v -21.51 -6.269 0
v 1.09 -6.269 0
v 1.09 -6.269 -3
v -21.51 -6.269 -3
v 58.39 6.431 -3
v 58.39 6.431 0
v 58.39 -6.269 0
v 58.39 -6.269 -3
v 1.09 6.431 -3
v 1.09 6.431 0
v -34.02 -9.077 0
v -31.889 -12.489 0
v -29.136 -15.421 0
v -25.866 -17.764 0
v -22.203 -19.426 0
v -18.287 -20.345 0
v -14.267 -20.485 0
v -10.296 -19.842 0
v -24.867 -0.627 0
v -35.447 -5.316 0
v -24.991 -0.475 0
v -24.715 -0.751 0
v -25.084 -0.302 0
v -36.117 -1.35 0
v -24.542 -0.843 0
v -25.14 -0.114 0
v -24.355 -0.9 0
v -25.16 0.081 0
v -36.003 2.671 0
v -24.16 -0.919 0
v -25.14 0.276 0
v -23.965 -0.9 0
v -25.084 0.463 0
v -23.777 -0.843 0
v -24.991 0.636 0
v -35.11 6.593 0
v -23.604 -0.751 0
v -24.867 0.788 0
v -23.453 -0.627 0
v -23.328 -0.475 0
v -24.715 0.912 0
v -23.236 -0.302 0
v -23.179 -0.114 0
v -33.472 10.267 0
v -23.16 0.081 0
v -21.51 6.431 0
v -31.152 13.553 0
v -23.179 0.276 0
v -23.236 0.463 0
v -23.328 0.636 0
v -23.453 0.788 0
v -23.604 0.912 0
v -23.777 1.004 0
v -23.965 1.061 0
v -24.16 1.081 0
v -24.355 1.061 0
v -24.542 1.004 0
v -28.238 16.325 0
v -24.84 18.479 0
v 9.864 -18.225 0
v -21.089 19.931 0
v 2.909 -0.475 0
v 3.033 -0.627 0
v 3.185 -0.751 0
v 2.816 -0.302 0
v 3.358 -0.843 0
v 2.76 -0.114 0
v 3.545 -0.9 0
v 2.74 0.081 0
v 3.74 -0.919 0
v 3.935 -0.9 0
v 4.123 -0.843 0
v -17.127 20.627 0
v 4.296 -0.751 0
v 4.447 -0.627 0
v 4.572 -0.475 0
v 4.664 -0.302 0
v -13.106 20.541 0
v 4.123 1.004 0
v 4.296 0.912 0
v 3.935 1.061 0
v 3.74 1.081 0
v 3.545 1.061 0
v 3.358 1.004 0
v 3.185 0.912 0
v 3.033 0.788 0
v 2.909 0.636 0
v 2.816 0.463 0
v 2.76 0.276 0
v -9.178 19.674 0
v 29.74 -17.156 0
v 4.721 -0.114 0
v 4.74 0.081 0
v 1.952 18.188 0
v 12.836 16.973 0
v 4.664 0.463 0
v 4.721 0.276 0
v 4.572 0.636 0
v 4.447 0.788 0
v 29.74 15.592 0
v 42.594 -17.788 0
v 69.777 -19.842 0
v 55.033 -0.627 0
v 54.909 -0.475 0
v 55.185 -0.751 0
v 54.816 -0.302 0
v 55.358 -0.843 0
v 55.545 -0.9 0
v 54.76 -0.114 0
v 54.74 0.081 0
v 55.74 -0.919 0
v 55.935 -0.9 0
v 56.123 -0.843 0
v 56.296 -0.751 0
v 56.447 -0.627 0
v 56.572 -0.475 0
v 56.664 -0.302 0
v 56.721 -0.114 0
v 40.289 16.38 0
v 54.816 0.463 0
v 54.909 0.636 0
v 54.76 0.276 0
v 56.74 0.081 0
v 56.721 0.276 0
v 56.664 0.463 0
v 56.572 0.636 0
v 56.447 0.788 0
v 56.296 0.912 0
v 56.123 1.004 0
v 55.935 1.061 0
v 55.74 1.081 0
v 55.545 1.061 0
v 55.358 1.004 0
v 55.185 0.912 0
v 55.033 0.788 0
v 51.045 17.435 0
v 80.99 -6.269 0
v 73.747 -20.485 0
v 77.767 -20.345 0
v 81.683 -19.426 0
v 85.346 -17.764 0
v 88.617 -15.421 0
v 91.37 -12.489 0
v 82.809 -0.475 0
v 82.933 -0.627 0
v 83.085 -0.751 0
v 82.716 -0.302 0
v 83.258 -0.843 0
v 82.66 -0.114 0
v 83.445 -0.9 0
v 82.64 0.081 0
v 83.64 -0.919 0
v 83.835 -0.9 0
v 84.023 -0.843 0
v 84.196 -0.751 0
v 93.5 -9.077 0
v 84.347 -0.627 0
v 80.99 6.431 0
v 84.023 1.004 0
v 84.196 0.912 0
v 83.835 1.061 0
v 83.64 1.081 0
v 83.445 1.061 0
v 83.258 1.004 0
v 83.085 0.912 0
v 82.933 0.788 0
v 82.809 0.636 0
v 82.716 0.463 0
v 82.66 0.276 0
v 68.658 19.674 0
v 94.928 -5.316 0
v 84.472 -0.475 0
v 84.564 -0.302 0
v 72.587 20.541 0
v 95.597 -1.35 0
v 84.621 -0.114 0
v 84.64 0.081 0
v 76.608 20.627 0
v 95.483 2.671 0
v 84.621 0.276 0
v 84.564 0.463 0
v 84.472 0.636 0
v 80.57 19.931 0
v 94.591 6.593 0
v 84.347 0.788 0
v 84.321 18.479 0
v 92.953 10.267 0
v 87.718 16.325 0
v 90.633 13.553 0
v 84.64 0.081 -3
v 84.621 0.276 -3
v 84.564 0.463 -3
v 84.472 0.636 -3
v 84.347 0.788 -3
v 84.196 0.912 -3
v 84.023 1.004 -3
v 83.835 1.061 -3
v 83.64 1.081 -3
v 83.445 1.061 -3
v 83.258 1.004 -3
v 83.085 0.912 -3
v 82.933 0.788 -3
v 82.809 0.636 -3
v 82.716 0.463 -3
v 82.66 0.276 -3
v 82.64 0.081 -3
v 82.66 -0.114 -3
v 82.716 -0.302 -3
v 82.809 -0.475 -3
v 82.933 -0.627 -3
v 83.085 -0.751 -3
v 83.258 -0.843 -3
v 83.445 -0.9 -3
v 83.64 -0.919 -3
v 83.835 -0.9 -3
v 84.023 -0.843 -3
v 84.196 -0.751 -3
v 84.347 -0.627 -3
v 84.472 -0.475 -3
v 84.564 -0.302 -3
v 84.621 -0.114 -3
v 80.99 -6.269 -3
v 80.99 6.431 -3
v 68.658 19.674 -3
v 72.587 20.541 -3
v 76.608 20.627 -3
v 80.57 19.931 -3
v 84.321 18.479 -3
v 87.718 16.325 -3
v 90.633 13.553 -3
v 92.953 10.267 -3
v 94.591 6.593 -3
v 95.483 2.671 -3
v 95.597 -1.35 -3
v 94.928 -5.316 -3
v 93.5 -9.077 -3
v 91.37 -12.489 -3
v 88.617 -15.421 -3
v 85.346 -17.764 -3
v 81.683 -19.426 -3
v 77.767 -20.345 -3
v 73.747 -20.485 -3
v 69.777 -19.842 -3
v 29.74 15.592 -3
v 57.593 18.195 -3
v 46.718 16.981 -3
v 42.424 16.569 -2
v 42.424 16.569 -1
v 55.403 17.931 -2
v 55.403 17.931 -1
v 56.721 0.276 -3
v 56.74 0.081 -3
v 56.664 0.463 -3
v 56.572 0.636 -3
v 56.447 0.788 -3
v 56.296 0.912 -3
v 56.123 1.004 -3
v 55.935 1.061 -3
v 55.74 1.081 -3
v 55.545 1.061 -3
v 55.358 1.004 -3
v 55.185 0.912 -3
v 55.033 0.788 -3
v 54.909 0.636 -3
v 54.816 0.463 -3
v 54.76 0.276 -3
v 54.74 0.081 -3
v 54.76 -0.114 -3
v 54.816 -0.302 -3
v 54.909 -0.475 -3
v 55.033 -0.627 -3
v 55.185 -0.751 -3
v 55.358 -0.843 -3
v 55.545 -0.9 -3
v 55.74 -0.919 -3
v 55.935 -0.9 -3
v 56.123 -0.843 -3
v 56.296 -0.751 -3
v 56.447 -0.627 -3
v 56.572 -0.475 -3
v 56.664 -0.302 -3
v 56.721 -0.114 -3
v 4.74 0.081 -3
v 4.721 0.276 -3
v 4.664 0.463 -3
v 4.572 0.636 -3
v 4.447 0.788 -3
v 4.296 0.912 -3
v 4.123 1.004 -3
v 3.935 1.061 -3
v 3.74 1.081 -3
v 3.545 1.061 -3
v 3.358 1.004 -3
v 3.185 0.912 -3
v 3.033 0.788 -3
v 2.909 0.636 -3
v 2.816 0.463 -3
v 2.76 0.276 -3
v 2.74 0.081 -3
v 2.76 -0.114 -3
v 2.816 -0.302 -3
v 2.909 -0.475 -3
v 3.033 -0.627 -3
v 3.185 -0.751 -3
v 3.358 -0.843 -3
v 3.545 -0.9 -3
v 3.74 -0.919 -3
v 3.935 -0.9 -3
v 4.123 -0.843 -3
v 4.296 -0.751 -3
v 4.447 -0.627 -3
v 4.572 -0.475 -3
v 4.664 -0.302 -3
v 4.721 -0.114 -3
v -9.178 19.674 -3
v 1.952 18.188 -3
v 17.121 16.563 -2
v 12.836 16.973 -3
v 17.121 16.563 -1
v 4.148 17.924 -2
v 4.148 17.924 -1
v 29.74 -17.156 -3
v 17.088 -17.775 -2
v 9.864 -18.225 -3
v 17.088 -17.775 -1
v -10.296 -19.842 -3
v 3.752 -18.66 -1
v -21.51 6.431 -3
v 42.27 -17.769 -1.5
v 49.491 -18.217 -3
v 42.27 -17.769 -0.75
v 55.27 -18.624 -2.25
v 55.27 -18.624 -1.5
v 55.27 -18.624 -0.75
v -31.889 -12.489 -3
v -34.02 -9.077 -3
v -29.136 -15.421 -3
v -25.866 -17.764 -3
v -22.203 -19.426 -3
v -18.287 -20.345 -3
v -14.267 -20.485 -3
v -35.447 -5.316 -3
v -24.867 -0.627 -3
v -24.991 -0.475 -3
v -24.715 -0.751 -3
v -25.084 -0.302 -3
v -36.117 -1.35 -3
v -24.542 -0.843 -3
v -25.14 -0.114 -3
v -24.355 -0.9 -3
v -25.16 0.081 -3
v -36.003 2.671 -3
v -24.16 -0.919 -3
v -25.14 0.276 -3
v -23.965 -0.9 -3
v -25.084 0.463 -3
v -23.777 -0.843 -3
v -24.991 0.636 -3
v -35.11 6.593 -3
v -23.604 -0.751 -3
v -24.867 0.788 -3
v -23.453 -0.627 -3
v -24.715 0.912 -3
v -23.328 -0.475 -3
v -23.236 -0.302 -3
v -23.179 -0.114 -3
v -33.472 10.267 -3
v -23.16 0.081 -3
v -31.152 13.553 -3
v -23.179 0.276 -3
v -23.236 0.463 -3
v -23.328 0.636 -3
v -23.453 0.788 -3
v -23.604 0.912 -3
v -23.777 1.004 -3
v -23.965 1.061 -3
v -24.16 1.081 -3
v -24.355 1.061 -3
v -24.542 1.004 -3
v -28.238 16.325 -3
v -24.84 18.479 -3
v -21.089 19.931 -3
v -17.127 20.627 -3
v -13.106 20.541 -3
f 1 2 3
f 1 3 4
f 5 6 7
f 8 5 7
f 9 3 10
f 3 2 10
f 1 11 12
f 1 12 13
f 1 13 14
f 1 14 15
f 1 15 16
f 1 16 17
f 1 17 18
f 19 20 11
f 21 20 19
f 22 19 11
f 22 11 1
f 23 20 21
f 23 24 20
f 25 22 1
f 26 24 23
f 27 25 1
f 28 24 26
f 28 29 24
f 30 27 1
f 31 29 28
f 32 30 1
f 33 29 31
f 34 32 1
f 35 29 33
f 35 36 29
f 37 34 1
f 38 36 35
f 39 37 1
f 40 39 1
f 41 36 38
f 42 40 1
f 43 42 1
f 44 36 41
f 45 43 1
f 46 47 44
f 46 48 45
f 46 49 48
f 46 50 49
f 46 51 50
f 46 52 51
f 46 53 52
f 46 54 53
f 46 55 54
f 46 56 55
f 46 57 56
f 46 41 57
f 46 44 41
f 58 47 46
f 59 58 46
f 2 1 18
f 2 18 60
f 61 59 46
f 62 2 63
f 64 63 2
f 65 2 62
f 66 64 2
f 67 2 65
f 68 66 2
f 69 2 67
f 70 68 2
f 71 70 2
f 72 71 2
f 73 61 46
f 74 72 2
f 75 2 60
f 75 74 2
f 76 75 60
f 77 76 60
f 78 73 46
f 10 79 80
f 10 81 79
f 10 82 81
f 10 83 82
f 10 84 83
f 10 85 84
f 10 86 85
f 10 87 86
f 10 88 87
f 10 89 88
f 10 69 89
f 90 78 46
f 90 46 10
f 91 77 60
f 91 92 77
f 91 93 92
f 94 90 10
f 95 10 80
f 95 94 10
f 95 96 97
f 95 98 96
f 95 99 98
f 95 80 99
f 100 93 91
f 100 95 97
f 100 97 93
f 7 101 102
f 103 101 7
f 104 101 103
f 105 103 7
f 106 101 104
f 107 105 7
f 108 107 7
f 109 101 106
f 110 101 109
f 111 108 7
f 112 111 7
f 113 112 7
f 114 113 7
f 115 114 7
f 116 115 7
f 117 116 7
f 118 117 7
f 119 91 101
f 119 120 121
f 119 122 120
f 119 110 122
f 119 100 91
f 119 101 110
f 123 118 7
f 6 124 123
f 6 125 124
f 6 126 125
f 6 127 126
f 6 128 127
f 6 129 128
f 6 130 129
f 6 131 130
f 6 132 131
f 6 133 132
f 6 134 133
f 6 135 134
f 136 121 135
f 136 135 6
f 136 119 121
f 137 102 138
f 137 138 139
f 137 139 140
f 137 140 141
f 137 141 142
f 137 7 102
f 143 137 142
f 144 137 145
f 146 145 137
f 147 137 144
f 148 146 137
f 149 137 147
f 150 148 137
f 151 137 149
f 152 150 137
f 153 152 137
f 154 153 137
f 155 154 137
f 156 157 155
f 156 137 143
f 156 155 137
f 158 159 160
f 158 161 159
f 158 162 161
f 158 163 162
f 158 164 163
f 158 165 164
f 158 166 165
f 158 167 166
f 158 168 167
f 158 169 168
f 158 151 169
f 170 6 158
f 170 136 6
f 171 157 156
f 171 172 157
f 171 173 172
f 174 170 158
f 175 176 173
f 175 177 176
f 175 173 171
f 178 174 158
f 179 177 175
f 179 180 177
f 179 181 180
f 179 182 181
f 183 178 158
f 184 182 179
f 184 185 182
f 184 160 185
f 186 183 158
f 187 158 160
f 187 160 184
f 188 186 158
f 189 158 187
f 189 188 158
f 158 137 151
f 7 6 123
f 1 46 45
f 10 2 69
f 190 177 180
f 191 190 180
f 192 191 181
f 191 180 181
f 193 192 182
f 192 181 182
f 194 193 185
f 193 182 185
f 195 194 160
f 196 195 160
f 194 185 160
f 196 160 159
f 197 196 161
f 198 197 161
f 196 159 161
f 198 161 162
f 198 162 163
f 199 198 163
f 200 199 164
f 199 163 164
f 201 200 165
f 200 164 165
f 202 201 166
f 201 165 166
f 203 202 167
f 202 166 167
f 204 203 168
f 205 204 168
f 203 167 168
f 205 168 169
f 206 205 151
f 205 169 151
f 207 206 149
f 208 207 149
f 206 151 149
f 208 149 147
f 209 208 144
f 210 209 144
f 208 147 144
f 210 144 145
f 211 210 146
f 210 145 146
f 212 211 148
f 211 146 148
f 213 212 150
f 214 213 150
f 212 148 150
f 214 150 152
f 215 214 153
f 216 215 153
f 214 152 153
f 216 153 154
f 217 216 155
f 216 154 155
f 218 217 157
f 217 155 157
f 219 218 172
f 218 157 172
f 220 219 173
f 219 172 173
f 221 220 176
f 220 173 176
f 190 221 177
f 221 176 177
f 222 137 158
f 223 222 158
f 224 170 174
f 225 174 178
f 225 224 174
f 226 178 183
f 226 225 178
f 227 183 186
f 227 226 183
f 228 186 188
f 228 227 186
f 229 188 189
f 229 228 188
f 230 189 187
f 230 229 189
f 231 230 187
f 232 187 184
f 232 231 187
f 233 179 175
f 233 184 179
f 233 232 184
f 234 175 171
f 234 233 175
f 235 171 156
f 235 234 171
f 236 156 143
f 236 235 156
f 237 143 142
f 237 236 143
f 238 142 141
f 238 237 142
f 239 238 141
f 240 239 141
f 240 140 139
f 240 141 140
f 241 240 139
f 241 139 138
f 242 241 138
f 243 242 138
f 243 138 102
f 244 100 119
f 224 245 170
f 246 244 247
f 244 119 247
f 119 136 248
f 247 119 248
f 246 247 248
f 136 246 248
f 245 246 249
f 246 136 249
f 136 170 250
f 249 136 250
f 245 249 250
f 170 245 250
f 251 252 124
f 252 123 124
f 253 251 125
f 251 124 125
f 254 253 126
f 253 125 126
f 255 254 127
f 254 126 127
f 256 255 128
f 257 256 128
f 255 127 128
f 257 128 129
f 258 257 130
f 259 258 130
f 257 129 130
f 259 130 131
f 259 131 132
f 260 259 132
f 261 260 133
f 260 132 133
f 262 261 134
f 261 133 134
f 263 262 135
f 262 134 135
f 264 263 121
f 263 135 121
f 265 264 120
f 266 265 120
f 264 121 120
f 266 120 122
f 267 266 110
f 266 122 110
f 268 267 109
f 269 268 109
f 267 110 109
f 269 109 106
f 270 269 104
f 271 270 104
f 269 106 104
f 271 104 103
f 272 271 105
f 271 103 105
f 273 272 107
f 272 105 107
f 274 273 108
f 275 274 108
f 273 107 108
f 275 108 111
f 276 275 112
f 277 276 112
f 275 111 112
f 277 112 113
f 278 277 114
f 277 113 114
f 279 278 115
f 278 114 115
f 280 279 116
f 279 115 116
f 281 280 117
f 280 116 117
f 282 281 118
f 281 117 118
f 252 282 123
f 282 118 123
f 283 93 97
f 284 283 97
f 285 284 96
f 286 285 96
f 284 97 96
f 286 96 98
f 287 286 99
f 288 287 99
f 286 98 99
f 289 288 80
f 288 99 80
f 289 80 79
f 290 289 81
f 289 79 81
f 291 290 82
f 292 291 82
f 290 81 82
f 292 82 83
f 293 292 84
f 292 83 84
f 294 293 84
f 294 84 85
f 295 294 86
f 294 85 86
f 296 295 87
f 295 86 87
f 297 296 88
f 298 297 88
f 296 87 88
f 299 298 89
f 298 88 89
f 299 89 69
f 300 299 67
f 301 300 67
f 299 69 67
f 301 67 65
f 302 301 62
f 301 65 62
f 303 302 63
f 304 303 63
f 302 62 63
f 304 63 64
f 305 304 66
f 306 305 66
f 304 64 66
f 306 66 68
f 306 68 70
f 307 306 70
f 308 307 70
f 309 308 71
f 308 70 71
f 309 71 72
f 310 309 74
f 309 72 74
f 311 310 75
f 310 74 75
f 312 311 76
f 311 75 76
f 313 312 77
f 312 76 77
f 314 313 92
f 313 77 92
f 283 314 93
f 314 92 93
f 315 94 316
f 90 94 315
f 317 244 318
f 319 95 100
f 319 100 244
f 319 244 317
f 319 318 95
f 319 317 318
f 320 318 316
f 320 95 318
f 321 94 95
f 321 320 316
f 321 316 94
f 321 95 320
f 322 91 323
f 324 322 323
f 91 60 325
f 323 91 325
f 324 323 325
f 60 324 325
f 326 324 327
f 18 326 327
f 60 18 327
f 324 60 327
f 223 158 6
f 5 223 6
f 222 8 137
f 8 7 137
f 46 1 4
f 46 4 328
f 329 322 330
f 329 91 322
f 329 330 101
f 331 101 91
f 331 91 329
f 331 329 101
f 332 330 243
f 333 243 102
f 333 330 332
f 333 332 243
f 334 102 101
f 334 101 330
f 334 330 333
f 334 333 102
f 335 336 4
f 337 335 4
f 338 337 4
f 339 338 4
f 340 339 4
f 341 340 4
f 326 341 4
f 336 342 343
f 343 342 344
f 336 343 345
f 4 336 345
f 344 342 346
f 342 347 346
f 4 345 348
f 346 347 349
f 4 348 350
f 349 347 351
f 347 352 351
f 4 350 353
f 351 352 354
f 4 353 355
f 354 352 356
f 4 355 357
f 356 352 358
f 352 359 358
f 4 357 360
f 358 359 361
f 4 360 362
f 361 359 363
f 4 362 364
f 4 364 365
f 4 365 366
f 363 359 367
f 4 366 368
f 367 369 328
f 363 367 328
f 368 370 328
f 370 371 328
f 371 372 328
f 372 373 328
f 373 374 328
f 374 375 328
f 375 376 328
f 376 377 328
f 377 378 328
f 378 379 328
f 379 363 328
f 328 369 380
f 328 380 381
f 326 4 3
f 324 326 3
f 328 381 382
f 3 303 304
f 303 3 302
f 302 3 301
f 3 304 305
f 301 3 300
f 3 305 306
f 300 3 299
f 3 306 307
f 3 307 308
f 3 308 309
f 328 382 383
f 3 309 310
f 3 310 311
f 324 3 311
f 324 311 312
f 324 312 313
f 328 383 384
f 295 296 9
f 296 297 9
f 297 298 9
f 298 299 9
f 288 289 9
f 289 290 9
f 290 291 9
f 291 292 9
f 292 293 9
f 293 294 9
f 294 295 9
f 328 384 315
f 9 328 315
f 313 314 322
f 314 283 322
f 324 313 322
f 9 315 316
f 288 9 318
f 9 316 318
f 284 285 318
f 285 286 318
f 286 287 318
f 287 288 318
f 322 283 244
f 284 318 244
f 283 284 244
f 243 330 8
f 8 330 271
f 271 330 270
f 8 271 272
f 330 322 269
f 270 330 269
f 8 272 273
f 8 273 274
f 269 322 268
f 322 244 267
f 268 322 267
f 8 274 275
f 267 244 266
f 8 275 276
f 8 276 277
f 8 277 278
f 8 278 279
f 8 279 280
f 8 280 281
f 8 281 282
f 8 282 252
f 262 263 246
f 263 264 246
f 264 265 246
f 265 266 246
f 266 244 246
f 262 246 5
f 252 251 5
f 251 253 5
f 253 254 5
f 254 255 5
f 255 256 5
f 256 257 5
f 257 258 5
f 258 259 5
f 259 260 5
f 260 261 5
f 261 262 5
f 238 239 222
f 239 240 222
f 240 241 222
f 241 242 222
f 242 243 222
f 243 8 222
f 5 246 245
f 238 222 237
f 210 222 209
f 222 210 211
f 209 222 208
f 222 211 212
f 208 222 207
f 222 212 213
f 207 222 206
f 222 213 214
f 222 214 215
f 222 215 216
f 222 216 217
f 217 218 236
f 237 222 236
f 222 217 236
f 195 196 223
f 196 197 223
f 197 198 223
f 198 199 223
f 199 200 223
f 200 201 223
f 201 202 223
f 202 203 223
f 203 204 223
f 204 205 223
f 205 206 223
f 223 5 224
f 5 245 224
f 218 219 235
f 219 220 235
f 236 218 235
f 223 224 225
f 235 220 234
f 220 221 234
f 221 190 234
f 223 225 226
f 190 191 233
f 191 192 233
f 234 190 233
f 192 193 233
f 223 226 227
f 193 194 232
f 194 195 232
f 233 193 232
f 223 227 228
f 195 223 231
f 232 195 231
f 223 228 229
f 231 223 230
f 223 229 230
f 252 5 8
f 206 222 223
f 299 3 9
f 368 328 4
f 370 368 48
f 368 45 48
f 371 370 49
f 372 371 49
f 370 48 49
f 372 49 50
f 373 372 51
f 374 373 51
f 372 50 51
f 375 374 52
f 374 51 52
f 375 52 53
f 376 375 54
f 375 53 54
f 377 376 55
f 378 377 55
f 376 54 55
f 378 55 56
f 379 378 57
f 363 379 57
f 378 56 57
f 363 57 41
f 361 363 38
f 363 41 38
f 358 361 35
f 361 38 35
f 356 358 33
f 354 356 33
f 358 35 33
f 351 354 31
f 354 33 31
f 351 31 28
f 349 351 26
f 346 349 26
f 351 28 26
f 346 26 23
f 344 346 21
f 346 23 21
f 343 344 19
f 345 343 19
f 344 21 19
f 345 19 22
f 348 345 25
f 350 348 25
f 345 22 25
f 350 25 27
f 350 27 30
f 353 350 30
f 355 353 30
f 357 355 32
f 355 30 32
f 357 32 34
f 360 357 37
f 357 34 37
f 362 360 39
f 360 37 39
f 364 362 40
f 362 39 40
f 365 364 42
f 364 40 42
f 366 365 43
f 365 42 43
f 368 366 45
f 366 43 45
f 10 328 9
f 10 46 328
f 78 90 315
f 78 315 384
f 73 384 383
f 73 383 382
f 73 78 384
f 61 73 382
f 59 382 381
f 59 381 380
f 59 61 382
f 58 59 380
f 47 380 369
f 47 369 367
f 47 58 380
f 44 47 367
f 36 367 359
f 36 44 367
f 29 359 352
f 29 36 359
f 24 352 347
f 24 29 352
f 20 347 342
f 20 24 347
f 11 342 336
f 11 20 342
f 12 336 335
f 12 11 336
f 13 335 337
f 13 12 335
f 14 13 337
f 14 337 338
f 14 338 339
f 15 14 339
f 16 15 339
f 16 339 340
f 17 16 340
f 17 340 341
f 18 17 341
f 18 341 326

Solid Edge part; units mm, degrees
sketch "Sketch1" plane through (0, 0, 0) normal (0, 0, 1) x (1, 0, 0)
  spline S0 degree 3 poles (-69.5242, 19.4932) (-23.3267, 12.9257) (22.6888, 12.9752) (68.6585, 19.674) knots 0 0 0 0 1 1 1 1
  spline S1 degree 3 poles (-69.54, -19.6556) (-23.1773, -15.4302) (23.2615, -15.4924) (69.7765, -19.8423) knots 0 0 0 0 1 1 1 1
  arc A0 (-69.54, -19.6556) -> (-69.5242, 19.4932) centre (-75.1666, -0.0789) cw
  arc A1 (68.6585, 19.674) -> (69.7765, -19.8423) centre (75.0403, 0.0806) cw
extrude "Protrusion1" add sketch "Sketch1" along normal blind 3
sketch "Sketch2" plane through (0.0555, 0.0806, 3) normal (0, 0, 1) x (1, 0, 0)
  circle A0 centre (83.5848, 0) radius 1
  circle A1 centre (55.6848, 0) radius 1
  line L0 (-58.5721, -6.5095) -> (-58.5721, 6.1905)
  line L1 (-58.5721, 6.1905) -> (-81.1721, 6.1905)
  line L2 (-81.1721, 6.1905) -> (-81.1721, -6.5095)
  line L3 (-81.1721, -6.5095) -> (-58.5721, -6.5095)
  circle A2 centre (-83.8221, -0.1595) radius 1
  circle A3 centre (-55.9221, -0.1595) radius 1
  line L4 (58.3348, 6.35) -> (58.3348, -6.35)
  line L5 (58.3348, -6.35) -> (80.9348, -6.35)
  line L6 (80.9348, -6.35) -> (80.9348, 6.35)
  line L7 (80.9348, 6.35) -> (58.3348, 6.35)
  dimension "D1" = 22.6
  dimension "D2" = 22.6
  dimension "D3" = 12.7
extrude "ExtrudedCutout_1" cut sketch "Sketch2" against normal blind 484.752
sketch "Sketch3" plane through (0.0555, 0.0806, 3) normal (0, 0, 1) x (1, 0, 0)
  line L0 (29.6848, 27.4896) -> (-99.1539, 27.4896)
  line L1 (-99.1539, 27.4896) -> (-99.1539, -25.8213)
  line L2 (-99.1539, -25.8213) -> (29.6848, -25.8213)
  line L3 (29.6848, -25.8213) -> (29.6848, 27.4896)
extrude "ExtrudedCutout_2" cut sketch "Sketch3" against normal blind 169.5138
sketch "Sketch4" plane through (0, 0, 0) normal (0, 0, 1) x (1, 0, 0)
  line L0 (29.7403, -17.1563) -> (29.7403, 15.5915)
  spline S0 degree 3 poles (29.7403, 15.5915) (42.2697, 16.3768) (55.2702, 17.7412) (68.6585, 19.674) knots 0 0 0 0 1 1 1 1
  spline S1 degree 3 poles (29.7403, -17.1563) (34.3353, -17.3622) (40.0841, -17.6253) (48.6781, -18.1532) (57.9287, -18.805) (64.4454, -19.3301) (69.7765, -19.8423) knots 0 0 0 0 0.312805 0.467988 0.637686 1 1 1 1
  arc A0 (68.6585, 19.674) -> (69.7765, -19.8423) centre (75.0403, 0.0806) cw
  line L1 (58.3903, -6.2694) -> (58.3903, 6.4306)
  line L2 (58.3903, 6.4306) -> (80.9903, 6.4306)
  line L3 (80.9903, 6.4306) -> (80.9903, -6.2694)
  line L4 (80.9903, -6.2694) -> (58.3903, -6.2694)
  circle A1 centre (55.7403, 0.0806) radius 1
  circle A2 centre (83.6403, 0.0806) radius 1
  line L5 (29.7403, -17.1563) -> (29.7403, 15.5915)
  spline S2 degree 3 poles (29.7403, 15.5915) (17.2109, 16.3768) (4.2104, 17.7412) (-9.1779, 19.674) knots 0 0 0 0 1 1 1 1
  arc A3 (-9.1779, 19.674) -> (-10.2959, -19.8423) centre (-15.5597, 0.0806) ccw
  spline S3 degree 3 poles (29.7403, -17.1563) (25.1453, -17.3622) (19.3965, -17.6253) (10.8024, -18.1532) (1.5519, -18.805) (-4.9648, -19.3301) (-10.2959, -19.8423) knots 0 0 0 0 0.312805 0.467988 0.637686 1 1 1 1
  line L6 (1.0903, -6.2694) -> (1.0903, 6.4306)
  line L7 (1.0903, 6.4306) -> (-21.5097, 6.4306)
  line L8 (-21.5097, 6.4306) -> (-21.5097, -6.2694)
  line L9 (-21.5097, -6.2694) -> (1.0903, -6.2694)
  circle A4 centre (3.7403, 0.0806) radius 1
  circle A5 centre (-24.1597, 0.0806) radius 1
extrude "ExtrudedProtrusion_2" add sketch "Sketch4" against normal blind 3
sketch "Sketch5" plane through (-3.213, 0.0806, 0) normal (0, 0, 1) x (0, 1, 0)
  line L0 (25.6992, -32.9533) -> (-24.0131, -32.9533)
  line L1 (-24.0131, -32.9533) -> (-24.0131, 35.3247)
  line L2 (-24.0131, 35.3247) -> (25.6992, 35.3247)
  line L3 (25.6992, 35.3247) -> (25.6992, -32.9533)
extrude "ExtrudedCutout_3" cut sketch "Sketch5" against normal blind 310.7547
sketch "Sketch6" plane through (69.6903, 6.4306, 0) normal (0, -1, 0) x (1, 0, 0)
  line L0 (-39.95, 3) -> (25.9565, 3)
  line L1 (25.9565, 3) -> (25.9565, 0)
  line L2 (25.9565, 0) -> (-39.95, 0)
  line L3 (-39.95, 0) -> (-39.95, 3)
extrude "ExtrudedCutout_4" cut sketch "Sketch6" against normal blind 369.6121
sketch "Sketch7" plane through (69.6903, -6.2694, 0) normal (0, 1, 0) x (1, 0, 0)
  line L0 (-39.95, -0.4111) -> (-39.95, -3)
  line L1 (-39.95, -3) -> (25.7218, -3)
  line L2 (25.7218, -3) -> (25.9565, 0)
  line L3 (25.9565, 0) -> (-39.95, -0.4111)
extrude "ExtrudedCutout_5" cut sketch "Sketch7" against normal blind 176.465
sketch "Sketch8" plane through (29.7403, -0.7635, 0) normal (-1, 0, 0) x (0, -1, 0)
  line L0 (20.933, 0) -> (-7.194, 0)
  line L1 (-7.194, 0) -> (-7.194, 4.1468)
  line L2 (-7.194, 4.1468) -> (20.933, 4.1468)
  line L3 (20.933, 4.1468) -> (20.933, 0)
extrude "ExtrudedCutout_6" cut sketch "Sketch8" against normal blind 228.3963
sketch "Sketch9" plane through (0, 0, 0) normal (0, 0, 1) x (1, 0, 0)
  line L0 (-21.5097, -6.2694) -> (-21.5097, 6.4306)
  line L1 (-21.5097, 6.4306) -> (1.0903, 6.4306)
  line L2 (1.0903, -6.2694) -> (1.0903, 6.4306)
  line L3 (1.0903, -6.2694) -> (-21.5097, -6.2694)
  circle A0 centre (3.7403, 0.0806) radius 1
  circle A1 centre (-24.1597, 0.0806) radius 1
  spline S0 degree 3 poles (29.7403, 15.5915) (17.2977, 16.3681) (4.325, 17.7289) (-9.1779, 19.674) knots 0 0 0 0 1 1 1 1
  arc A2 (-9.1779, 19.674) -> (-10.2959, -19.8423) centre (-15.5597, 0.0806) ccw
  spline S1 degree 3 poles (29.7403, -17.1563) (17.4202, -17.6536) (4.1171, -18.5003) (-10.2959, -19.8423) knots 0 0 0 0 1 1 1 1
  line L4 (29.7403, -17.1563) -> (29.7403, 15.5915)
extrude "ExtrudedProtrusion_3" add sketch "Sketch9" against normal blind 3
